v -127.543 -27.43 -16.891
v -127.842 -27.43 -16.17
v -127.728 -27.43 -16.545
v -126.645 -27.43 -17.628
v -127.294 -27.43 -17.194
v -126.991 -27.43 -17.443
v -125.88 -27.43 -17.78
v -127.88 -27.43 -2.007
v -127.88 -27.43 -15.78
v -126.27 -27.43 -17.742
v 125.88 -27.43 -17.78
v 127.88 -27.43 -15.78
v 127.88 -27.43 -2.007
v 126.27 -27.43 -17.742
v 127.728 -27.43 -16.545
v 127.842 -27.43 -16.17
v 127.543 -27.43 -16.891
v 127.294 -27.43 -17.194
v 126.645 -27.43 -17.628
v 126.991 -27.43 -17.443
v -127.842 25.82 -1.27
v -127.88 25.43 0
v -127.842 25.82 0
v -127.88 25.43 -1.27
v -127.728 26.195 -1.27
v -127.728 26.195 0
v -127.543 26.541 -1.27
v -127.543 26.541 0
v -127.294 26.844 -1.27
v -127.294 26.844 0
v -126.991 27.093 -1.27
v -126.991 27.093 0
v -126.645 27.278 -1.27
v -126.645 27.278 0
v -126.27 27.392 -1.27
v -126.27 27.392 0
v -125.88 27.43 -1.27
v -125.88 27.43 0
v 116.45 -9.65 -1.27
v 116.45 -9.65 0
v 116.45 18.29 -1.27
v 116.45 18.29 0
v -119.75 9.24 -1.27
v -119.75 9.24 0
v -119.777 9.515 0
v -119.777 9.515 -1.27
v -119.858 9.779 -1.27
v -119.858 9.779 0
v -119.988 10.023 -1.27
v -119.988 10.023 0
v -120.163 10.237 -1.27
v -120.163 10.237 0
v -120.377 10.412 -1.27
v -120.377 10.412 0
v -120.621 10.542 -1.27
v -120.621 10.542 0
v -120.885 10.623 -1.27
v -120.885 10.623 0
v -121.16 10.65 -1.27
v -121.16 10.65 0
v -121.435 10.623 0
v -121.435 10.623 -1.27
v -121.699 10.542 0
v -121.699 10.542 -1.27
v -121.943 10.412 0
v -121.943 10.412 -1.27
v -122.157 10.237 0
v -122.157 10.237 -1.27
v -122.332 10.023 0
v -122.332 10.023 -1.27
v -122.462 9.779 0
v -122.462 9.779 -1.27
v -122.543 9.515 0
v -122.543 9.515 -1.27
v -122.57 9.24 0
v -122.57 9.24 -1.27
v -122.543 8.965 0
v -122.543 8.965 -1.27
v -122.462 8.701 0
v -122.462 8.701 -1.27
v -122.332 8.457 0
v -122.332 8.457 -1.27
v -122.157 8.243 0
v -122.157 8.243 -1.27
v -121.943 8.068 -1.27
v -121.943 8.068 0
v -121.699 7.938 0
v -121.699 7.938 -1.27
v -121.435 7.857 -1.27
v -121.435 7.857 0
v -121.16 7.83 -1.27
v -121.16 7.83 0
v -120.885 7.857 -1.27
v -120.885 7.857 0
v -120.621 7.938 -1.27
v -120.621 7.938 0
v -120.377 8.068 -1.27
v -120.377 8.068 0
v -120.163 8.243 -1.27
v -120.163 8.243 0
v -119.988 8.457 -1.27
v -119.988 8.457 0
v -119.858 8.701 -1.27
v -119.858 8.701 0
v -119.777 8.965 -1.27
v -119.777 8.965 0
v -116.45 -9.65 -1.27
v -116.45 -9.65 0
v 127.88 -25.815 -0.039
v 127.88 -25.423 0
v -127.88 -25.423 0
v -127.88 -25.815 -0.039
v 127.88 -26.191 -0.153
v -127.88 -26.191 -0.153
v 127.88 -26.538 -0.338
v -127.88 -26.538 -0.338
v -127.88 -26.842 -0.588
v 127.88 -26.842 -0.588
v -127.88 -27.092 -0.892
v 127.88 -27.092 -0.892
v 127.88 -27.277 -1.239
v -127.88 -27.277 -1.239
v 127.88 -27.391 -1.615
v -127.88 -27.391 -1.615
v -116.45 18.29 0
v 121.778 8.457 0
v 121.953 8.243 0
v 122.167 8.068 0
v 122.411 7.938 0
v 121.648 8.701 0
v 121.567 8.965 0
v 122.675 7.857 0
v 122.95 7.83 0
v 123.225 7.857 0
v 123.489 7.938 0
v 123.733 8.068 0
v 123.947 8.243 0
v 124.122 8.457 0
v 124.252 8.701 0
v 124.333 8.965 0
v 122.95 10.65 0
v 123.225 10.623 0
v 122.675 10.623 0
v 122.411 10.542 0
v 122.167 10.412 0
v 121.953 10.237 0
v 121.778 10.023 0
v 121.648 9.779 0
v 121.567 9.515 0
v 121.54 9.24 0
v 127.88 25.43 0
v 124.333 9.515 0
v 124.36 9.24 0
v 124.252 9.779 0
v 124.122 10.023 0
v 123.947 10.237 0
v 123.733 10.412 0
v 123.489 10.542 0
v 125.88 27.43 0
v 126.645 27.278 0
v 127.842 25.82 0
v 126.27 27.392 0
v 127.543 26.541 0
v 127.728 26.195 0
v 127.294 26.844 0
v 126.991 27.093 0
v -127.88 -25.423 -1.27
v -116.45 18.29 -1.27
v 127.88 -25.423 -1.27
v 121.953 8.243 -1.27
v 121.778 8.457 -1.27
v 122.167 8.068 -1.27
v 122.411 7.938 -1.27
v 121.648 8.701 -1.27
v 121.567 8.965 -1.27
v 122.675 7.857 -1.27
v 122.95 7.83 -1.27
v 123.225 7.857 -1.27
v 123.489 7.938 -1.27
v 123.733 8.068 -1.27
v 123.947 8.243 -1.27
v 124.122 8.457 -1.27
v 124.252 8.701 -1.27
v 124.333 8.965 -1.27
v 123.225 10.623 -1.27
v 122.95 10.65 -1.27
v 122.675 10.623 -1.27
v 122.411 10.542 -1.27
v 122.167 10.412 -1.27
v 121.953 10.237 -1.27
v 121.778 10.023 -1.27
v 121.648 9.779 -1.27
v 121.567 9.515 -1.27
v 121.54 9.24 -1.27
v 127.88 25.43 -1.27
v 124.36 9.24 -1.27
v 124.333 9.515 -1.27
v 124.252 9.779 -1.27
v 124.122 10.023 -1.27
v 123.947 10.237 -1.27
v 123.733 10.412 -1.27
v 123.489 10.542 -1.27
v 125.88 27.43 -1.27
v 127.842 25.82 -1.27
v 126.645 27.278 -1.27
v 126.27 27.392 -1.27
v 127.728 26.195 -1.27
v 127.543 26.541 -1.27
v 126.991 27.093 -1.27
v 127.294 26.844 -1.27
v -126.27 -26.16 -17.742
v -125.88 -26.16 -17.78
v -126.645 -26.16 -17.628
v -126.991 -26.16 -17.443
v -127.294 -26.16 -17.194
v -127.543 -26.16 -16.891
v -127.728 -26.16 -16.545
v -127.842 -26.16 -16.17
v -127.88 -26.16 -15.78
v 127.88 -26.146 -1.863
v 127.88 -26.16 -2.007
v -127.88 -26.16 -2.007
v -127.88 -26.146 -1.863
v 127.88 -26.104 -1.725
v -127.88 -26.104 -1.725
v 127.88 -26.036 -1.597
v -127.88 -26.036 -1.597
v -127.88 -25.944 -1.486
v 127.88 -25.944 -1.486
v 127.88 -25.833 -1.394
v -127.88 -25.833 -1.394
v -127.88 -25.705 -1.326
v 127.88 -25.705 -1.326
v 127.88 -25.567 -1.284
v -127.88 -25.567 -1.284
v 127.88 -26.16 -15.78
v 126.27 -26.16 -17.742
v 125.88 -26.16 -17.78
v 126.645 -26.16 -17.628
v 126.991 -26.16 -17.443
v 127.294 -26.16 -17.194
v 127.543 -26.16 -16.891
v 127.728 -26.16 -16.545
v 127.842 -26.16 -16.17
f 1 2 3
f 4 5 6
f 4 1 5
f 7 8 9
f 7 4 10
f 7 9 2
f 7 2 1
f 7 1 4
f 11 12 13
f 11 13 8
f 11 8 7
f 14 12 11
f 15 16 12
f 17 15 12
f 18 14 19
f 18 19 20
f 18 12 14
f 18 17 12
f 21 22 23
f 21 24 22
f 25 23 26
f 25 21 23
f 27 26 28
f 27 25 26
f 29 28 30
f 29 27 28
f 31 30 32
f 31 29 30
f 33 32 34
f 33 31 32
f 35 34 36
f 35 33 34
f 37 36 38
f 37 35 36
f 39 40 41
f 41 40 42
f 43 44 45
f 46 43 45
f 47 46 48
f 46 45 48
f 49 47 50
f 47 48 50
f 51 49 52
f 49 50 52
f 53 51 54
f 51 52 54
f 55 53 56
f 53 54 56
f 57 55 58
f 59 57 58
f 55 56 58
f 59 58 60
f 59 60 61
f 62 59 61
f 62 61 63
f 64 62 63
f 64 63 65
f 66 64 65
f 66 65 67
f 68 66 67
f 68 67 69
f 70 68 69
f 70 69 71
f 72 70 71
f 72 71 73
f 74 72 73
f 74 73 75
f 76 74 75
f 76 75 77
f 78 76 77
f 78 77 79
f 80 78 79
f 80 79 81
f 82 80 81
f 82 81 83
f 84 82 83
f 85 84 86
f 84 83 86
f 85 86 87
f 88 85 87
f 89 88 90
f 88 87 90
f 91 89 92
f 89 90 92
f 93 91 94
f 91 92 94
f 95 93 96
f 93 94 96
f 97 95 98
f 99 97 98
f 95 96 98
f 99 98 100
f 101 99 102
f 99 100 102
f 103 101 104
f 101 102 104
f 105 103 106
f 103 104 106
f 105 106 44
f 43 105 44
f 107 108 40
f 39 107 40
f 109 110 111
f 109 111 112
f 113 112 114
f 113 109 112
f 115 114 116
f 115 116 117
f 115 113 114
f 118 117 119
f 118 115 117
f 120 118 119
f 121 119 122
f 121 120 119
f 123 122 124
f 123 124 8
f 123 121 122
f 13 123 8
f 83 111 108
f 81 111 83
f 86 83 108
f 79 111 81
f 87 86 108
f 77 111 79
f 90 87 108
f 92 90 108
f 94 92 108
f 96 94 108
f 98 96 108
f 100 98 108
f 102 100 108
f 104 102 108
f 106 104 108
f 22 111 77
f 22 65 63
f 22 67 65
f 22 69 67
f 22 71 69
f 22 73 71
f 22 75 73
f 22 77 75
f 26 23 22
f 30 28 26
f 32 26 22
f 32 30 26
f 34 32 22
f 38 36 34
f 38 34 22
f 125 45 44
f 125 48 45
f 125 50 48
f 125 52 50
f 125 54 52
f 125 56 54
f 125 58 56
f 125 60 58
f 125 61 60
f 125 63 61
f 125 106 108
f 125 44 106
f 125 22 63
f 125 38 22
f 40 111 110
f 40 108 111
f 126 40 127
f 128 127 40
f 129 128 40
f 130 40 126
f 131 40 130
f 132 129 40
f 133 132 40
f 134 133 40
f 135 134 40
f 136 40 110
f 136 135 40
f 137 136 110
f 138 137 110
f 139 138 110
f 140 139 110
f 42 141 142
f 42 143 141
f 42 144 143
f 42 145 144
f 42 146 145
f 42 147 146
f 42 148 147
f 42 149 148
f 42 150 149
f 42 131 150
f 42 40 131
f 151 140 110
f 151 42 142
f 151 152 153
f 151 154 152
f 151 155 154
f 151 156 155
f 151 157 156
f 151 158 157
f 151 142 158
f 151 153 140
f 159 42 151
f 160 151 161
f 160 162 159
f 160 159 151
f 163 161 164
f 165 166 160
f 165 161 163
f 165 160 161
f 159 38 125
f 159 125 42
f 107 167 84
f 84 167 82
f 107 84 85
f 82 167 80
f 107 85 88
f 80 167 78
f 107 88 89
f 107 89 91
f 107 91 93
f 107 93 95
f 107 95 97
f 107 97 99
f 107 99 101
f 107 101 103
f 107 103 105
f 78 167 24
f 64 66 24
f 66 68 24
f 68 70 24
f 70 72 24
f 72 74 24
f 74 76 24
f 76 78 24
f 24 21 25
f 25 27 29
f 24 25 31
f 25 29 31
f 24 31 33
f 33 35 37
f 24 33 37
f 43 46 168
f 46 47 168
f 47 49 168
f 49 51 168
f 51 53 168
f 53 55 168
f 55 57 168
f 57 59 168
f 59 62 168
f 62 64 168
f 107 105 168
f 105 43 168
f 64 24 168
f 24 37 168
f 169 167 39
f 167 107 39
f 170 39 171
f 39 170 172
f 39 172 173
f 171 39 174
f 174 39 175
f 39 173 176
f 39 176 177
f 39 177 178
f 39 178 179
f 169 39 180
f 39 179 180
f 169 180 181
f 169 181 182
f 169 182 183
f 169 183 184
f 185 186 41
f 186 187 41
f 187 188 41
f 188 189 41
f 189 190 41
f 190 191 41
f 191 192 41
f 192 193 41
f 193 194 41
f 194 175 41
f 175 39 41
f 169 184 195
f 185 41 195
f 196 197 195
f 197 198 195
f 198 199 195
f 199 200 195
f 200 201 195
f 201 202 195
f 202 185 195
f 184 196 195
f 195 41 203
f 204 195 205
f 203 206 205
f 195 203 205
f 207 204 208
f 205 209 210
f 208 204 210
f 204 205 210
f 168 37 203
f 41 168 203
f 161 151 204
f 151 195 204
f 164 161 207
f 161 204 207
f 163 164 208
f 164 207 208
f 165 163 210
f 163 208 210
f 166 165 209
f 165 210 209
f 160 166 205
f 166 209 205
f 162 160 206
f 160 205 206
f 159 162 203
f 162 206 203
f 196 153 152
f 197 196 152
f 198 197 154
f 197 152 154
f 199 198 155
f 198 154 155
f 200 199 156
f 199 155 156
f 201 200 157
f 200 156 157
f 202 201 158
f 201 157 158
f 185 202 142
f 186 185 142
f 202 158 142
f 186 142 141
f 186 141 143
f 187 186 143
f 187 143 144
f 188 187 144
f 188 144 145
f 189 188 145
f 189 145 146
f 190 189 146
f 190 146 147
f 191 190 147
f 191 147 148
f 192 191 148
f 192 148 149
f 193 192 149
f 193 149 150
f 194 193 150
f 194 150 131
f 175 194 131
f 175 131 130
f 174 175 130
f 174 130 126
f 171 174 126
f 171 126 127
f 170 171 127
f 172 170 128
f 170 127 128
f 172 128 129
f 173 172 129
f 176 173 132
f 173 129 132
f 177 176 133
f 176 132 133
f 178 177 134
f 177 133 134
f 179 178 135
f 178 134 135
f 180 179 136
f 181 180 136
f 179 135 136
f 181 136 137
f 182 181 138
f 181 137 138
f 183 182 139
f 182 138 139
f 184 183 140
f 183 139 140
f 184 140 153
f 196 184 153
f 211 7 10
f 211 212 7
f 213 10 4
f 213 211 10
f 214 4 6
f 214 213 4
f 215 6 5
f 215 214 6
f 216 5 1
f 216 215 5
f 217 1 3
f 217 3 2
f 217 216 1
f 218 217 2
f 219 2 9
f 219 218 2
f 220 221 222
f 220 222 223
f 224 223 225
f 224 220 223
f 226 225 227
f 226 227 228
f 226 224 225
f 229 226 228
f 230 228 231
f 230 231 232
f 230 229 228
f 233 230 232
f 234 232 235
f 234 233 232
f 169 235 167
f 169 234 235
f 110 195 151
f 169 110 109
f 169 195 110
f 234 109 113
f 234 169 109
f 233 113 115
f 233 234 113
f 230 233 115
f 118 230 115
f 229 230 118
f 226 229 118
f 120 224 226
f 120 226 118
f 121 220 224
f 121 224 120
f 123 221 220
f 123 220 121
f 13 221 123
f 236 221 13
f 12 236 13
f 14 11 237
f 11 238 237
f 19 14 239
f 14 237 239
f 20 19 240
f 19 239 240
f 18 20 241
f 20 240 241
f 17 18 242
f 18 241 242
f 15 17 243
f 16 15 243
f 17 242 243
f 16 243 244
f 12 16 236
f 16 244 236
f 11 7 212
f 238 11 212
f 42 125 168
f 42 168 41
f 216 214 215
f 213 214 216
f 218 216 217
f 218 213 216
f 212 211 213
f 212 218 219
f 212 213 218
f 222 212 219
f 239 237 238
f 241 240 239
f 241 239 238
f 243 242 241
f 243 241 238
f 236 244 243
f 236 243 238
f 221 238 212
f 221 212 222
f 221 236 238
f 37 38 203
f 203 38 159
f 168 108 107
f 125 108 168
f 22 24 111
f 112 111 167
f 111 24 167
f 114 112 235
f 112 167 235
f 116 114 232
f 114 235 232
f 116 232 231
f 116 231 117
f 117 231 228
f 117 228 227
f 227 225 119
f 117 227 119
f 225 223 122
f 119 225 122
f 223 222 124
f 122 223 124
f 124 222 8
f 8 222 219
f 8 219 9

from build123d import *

# Parameters (mm, degrees)
SKETCH2_W                    = 255.76
SKETCH2_H                    = 54.86
SKETCH2_W_2                  = 232.9
SKETCH2_H_2                  = 27.94
BASE_FLANGE1_DEPTH           = 1.27
EDGE_FLANGE1_STRIP_W         = 6.5532
EDGE_FLANGE1_STRIP_H         = 1.27
EDGE_FLANGE1_STRIP_CUT_DEPTH = 255.76
EDGE_FLANGE1_DEPTH           = 255.76
F_34_0_111_DIAMETER_HOLE1_D  = 2.8194
FILLET1_R                    = 2


# Sheet-metal steps are written as plain solids
with BuildPart() as part:
    # Sketch2 → Base-Flange1 (new body)
    with BuildSketch(Plane.XY):
        Rectangle(SKETCH2_W, SKETCH2_H)
        with Locations((0, 4.32)):
            Rectangle(SKETCH2_W_2, SKETCH2_H_2, mode=Mode.SUBTRACT)
    extrude(amount=-BASE_FLANGE1_DEPTH)

    # Edge-Flange1 strip (across the edge) → Edge-Flange1 strip cut (cut)
    with BuildSketch(Plane(origin=(127.88, -27.43, -1.27), x_dir=(0, 1, 0), z_dir=(-1, 0, 0))):
        with Locations((-1.27, -0.635)):
            Rectangle(EDGE_FLANGE1_STRIP_W, EDGE_FLANGE1_STRIP_H)
    extrude(amount=EDGE_FLANGE1_STRIP_CUT_DEPTH, mode=Mode.SUBTRACT)

    # Edge-Flange1 section (across the edge) → Edge-Flange1 (add)
    with BuildSketch(Plane(origin=(127.88, -27.43, -1.27), x_dir=(0, 1, 0), z_dir=(-1, 0, 0))):
        with BuildLine():
            Line((0, 0.7366), (0, 16.51))
            Line((0, 16.51), (1.27, 16.51))
            Line((1.27, 16.51), (1.27, 0.7366))
            ThreePointArc((1.27, 0.7366), (1.485745145, 0.215745145), (2.0066, 0))
            Line((2.0066, 0), (2.0066, -1.27))
            ThreePointArc((2.0066, -1.27), (0.587719533, -0.682280467), (0, 0.7366))
        make_face()
    extrude(amount=EDGE_FLANGE1_DEPTH)

    # #34 (0.111) Diameter Hole1 (through all)
    with Locations(Plane(origin=(0, 0, -1.27), x_dir=(-1, 0, 0), z_dir=(0, 0, -1))):
        with Locations((-122.95, 9.24), (121.16, 9.24)):
            Hole(F_34_0_111_DIAMETER_HOLE1_D / 2)

    # Fillet1
    fillet1_edges = [part.edges().sort_by_distance(p)[0] for p in [
        (127.88, -26.795, -17.78),
        (-127.88, -26.795, -17.78),
        (-127.88, 27.43, -0.635),
        (127.88, 27.43, -0.635),
    ]]
    fillet(fillet1_edges, radius=FILLET1_R)


solid = part.part
